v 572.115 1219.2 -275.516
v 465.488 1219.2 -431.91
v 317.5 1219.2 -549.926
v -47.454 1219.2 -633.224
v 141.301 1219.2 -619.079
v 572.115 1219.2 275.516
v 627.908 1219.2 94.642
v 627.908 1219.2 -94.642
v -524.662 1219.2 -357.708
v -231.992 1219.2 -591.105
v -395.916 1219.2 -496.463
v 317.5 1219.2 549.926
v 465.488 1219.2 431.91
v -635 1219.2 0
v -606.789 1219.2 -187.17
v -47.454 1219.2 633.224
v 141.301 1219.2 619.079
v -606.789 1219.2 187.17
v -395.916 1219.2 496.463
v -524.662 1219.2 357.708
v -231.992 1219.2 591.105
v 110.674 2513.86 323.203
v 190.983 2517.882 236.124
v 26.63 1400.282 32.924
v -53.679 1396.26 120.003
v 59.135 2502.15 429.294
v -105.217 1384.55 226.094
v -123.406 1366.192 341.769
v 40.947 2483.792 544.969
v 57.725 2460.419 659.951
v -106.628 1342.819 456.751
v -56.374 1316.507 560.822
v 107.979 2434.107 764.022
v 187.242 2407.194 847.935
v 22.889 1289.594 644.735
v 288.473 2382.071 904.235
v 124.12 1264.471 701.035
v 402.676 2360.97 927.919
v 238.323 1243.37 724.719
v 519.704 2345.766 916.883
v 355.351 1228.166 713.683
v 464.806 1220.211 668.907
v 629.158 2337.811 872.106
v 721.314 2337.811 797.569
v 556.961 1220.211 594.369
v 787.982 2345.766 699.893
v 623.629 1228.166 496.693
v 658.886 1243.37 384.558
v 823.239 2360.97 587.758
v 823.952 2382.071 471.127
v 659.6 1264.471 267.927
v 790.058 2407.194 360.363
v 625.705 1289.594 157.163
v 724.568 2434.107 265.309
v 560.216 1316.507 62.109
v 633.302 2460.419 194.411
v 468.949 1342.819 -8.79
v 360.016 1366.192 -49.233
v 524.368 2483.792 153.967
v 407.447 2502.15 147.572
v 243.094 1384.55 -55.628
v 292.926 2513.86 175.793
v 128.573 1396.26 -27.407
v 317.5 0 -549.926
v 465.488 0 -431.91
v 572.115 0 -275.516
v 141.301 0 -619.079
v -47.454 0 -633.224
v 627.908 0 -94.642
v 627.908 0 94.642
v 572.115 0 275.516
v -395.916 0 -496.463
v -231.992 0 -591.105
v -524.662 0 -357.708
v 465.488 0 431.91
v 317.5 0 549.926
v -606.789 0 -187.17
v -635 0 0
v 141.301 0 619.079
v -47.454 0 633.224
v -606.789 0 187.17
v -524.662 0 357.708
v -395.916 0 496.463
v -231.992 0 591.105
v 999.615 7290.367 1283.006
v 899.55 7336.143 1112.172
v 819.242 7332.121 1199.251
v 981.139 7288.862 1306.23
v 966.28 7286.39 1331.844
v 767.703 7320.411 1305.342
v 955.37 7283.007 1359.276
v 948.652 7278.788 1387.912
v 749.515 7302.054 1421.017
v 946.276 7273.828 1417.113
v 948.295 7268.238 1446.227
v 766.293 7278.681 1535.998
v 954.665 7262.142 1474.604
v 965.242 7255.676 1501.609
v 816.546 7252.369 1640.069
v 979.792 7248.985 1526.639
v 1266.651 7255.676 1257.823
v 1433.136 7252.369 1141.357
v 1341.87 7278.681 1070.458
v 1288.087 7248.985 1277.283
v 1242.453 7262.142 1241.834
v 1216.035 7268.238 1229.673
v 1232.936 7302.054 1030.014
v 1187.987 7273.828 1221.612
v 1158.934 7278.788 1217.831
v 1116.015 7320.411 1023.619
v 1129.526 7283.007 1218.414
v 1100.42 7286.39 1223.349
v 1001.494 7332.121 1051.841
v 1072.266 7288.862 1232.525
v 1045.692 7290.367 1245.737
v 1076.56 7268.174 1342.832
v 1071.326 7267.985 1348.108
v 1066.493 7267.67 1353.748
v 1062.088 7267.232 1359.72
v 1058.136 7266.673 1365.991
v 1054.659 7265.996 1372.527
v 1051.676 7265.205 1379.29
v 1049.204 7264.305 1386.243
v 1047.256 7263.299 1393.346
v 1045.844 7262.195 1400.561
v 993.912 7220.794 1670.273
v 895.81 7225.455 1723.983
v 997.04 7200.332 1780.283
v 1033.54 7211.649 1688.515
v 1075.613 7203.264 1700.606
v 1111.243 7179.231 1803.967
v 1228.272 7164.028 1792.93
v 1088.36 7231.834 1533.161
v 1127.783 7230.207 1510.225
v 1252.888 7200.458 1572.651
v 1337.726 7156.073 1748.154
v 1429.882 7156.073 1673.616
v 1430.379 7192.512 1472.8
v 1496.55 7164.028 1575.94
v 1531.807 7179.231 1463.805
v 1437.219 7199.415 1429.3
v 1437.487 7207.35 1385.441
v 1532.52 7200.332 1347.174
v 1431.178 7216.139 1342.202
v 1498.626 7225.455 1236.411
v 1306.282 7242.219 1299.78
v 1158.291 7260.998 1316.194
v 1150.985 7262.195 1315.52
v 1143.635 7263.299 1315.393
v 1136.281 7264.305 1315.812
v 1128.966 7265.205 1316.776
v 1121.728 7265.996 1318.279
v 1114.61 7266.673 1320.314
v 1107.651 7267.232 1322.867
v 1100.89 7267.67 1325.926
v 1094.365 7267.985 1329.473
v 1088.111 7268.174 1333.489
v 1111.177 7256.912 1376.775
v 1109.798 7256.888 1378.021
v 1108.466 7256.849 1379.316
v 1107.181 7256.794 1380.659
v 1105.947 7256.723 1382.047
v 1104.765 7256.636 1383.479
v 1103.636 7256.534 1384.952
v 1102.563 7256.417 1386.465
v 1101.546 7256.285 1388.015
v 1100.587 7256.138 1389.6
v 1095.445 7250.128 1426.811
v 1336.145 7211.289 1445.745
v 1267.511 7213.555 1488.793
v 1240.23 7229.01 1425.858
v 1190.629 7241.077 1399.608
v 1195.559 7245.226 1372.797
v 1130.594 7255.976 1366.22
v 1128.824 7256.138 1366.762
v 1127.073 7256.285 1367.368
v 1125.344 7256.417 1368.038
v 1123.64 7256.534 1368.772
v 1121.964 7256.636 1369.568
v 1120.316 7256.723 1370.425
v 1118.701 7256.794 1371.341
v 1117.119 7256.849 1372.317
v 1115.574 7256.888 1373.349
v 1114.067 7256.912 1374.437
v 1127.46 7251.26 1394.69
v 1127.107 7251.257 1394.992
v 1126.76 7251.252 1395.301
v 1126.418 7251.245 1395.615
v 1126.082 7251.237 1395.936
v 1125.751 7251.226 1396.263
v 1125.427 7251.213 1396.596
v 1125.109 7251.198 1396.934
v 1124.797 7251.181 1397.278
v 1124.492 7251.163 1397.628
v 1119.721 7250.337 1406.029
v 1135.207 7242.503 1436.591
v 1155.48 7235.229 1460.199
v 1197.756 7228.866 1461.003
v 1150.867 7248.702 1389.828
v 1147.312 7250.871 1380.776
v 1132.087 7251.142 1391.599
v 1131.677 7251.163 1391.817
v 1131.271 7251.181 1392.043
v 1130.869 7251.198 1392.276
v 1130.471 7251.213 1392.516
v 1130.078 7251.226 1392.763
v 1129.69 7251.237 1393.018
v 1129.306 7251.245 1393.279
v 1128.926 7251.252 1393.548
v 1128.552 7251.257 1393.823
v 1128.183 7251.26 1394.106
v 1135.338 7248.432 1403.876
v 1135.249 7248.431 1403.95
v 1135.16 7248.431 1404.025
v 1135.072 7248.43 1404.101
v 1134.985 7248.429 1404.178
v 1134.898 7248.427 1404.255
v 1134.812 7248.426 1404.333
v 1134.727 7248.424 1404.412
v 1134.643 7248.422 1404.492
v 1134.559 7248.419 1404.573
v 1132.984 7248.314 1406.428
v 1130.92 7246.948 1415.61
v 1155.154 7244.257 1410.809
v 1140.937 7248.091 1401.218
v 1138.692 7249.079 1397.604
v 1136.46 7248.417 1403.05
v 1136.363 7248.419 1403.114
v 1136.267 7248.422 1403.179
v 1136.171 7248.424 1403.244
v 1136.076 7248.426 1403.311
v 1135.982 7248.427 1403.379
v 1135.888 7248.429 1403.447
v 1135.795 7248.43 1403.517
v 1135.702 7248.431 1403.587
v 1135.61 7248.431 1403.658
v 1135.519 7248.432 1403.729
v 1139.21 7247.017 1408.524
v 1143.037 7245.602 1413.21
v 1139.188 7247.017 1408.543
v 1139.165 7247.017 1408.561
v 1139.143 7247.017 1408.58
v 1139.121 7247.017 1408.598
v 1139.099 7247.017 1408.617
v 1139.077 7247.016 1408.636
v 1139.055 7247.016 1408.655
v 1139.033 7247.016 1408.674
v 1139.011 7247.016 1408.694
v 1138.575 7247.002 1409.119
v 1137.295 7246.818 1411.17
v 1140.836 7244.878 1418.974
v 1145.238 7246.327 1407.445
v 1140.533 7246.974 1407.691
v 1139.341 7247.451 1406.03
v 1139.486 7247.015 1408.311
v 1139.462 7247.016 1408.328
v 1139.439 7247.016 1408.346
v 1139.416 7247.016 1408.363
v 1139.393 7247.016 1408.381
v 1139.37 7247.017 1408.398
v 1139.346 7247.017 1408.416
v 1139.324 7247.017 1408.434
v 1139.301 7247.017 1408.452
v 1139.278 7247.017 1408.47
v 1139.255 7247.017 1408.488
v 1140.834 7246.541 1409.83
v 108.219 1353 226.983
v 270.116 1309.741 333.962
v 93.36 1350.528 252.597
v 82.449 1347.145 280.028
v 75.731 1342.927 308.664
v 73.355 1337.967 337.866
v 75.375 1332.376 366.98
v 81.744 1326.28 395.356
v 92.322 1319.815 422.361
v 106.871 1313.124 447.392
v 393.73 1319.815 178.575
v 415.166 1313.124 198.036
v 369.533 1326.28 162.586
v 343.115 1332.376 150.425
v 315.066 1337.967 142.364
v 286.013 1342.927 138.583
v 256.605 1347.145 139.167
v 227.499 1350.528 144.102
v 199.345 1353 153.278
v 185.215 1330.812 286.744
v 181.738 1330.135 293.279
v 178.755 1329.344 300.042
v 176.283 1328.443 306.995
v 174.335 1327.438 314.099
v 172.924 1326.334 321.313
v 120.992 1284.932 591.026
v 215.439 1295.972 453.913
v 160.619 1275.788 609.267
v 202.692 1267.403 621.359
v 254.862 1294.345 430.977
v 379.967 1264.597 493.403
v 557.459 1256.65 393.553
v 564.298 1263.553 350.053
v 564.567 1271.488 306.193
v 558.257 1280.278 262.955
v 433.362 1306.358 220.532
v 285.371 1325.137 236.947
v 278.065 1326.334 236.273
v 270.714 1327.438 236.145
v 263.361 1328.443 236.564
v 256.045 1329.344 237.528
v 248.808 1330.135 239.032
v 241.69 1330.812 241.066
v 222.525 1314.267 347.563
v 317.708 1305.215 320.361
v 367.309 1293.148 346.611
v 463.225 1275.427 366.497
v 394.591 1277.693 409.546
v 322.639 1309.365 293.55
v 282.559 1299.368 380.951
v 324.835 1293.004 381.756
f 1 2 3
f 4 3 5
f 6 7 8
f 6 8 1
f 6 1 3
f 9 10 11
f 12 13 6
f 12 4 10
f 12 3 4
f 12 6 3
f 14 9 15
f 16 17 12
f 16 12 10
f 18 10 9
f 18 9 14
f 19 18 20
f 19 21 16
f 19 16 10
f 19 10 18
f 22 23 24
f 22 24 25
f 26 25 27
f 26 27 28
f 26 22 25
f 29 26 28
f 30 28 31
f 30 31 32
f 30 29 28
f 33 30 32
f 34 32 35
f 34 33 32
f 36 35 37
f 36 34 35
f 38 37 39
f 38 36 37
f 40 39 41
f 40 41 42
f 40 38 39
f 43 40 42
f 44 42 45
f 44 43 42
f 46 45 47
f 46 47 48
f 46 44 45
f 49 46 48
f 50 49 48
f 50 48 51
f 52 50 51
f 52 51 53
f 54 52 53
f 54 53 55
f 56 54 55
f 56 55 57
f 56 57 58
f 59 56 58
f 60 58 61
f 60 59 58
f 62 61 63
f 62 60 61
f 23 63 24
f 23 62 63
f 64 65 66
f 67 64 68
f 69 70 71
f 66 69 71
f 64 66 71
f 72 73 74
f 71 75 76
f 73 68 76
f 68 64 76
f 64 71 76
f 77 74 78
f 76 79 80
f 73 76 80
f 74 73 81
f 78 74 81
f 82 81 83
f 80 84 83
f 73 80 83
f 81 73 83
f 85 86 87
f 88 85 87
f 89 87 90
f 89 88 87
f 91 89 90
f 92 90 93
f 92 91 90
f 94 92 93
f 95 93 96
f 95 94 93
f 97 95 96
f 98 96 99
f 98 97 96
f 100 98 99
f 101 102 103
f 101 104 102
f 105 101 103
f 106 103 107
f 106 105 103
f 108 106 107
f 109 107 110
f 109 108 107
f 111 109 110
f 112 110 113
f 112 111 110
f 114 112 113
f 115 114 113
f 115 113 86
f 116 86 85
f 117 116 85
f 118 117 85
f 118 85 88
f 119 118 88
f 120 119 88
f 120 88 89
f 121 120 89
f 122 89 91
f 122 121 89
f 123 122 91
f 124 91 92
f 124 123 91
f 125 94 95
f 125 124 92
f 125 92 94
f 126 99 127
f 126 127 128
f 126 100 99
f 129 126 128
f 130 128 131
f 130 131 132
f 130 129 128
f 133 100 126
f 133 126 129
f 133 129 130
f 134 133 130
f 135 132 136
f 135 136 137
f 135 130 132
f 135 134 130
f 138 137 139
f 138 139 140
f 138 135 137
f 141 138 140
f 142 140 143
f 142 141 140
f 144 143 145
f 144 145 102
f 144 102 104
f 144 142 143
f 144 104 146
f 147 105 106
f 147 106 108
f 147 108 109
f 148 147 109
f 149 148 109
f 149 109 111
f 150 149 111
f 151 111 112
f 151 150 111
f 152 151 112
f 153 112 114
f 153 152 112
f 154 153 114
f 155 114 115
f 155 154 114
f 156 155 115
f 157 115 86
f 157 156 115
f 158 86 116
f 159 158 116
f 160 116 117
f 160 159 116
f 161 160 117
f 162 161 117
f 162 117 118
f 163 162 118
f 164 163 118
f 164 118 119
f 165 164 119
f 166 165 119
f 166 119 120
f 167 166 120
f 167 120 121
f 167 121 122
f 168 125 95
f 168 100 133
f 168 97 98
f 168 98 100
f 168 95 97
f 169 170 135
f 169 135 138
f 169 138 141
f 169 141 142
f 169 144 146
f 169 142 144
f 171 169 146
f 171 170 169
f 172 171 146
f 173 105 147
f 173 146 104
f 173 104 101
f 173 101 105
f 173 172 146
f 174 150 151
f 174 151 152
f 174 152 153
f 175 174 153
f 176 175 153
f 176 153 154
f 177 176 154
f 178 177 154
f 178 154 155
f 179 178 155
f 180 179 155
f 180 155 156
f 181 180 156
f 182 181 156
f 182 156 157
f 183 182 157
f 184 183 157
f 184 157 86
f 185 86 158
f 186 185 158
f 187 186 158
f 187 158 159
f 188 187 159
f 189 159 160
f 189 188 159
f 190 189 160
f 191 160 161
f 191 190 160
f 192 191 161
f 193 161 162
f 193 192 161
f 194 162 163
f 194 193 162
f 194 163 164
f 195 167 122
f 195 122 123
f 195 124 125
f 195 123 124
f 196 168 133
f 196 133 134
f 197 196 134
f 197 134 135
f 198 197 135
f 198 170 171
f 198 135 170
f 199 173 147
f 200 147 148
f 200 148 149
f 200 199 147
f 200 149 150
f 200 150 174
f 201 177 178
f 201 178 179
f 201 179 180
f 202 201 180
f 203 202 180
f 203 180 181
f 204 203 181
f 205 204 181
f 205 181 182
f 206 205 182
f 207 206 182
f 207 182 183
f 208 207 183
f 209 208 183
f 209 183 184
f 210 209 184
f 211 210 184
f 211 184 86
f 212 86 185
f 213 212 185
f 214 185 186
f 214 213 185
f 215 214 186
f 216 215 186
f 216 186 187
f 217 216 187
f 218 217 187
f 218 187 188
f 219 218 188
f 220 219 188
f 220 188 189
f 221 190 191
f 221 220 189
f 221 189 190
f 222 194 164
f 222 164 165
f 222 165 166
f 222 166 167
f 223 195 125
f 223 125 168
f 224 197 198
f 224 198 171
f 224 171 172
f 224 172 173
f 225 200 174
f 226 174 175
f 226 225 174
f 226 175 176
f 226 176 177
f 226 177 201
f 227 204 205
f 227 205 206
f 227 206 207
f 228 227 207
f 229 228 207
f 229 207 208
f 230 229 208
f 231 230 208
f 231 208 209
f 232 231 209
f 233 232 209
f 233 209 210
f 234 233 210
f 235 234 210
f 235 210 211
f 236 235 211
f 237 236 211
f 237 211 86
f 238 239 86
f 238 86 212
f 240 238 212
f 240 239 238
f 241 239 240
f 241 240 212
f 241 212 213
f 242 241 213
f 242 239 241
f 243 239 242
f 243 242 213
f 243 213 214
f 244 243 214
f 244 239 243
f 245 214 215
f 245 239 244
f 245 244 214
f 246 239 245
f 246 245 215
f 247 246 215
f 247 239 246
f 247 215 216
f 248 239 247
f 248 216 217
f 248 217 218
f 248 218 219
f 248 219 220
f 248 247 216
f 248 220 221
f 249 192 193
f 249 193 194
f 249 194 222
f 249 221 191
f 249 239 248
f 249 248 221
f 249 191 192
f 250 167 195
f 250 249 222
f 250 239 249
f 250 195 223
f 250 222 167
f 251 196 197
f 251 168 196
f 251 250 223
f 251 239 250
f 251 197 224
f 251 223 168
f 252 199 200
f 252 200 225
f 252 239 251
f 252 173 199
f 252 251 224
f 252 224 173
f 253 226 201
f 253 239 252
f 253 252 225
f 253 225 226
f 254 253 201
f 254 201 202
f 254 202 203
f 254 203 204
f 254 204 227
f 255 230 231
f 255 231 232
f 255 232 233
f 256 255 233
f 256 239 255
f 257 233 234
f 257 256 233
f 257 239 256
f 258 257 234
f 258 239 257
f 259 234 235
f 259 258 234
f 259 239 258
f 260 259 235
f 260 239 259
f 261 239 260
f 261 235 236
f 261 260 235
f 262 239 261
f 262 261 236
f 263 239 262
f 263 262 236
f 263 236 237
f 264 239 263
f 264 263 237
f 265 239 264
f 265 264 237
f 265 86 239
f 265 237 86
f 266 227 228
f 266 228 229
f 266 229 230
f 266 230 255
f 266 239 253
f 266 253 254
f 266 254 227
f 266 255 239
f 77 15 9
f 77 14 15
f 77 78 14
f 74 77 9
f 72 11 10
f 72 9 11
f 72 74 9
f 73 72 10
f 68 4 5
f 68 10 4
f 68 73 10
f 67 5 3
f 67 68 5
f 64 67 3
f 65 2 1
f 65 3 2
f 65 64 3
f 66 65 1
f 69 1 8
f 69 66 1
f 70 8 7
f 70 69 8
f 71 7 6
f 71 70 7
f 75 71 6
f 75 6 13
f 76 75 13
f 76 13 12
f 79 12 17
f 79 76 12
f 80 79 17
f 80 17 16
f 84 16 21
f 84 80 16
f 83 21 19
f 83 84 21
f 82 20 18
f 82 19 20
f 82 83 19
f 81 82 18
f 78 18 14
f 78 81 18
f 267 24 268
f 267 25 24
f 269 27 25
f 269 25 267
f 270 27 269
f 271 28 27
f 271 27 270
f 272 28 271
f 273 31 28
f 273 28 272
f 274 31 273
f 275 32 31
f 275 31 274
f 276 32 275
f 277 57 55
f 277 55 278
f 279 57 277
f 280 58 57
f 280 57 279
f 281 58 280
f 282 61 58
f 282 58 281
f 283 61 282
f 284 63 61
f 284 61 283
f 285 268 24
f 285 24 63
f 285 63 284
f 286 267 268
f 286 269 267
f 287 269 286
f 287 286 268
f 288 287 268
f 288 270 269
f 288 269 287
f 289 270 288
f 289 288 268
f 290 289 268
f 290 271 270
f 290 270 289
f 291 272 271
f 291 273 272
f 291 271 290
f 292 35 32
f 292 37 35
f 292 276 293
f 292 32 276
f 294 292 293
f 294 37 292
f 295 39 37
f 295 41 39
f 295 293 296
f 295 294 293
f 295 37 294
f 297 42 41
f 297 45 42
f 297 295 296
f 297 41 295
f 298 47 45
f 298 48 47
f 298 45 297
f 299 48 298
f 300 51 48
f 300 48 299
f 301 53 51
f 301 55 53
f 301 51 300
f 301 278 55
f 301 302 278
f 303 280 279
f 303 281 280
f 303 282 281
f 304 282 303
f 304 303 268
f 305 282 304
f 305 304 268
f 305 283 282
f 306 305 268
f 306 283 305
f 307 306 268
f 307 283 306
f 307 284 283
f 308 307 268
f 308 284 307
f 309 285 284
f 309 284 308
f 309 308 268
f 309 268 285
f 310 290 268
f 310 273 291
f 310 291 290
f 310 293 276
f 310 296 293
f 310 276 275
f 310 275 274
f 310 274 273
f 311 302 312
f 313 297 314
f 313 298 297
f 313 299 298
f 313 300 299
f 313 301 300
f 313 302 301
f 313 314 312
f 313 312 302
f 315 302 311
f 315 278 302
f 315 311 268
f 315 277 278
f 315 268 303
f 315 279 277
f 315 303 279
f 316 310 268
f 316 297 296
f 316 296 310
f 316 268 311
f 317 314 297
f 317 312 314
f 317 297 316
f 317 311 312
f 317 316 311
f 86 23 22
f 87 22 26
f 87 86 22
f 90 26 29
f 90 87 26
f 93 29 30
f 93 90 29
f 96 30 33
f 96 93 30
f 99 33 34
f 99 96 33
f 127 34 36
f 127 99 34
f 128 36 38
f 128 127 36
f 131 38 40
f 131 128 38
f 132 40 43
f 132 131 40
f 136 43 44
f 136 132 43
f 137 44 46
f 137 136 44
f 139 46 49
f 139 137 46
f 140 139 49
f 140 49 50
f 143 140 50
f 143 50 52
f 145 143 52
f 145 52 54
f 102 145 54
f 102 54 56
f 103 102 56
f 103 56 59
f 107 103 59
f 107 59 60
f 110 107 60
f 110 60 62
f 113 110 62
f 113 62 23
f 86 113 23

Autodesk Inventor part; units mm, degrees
ref_plane "YZ Plane" through (0, 0, 0) normal (1, 0, 0) x (0, 1, 0)
sketch "Sketch1" plane through (0, 0, 0) normal (0, 1, 0) x (-1, 0, 0)
  circle A0 centre (0, 0) radius 635
  dimension "d0" = 1270
extrude "Extrusion1" add sketch "Sketch1" along normal blind 1219.2
ref_plane "Work Plane2" through (0, 0, 635) normal (0, 0, 1) x (1, 0, 0)
ref_plane "Work Plane3" through (0, 0, 939.8) normal (0, 0, 1) x (1, 0, 0)
sketch "Sketch2" plane through (0, 1219.2, 0) normal (0, 1, 0) x (1, 0, 0)
  line L0 (0, 0) -> (698.5, -863.6)
  line L1 (698.5, -863.6) -> (0, -863.6)
  line L2 (0, -863.6) -> (0, 0)
  circle A0 centre (0, 0) radius 635 projected
  line L3 (1039.1588, -635) -> (-914.0265, -635) projected
  line L4 (1039.1588, -939.8) -> (-914.0265, -939.8) projected
  line L5 (760.1324, -939.8) -> (0, -939.8)
  point P0 (513.6029, -635)
  dimension "d3" = 863.6
  dimension "d11" = 698.5
ref_plane "Work Plane5" through (0, 1219.2, 0) normal (-0.7775111, 0, 0.6288692) x (0.6288692, 0, 0.7775111)
sketch "Sketch4" plane through (0, 1219.2, 0) normal (0, 1, 0) x (1, 0, 0)
  line L0 (0, -863.6) -> (0, 0) projected
  line L1 (1024.4813, -1266.6315) -> (-825.9616, 1021.1889) projected
  line L2 (1039.1588, -939.8) -> (-914.0265, -939.8) projected
  line L3 (0, -838.2) -> (677.9559, -838.2)
  dimension "d10" = 101.6
sketch "Sketch3" plane through (0, 1219.2, 0) normal (-0.7775111, 0, 0.6288692) x (0.6288692, 0, 0.7775111)
  line L0 (1208.7288, 0) -> (1208.7288, 1117.6)
  line L1 (635, -1219.2) -> (-635, -1219.2) projected
  line L2 (816.7086, 0) -> (1078.0554, 1117.6)
  line L3 (1078.0554, 0) -> (1078.0554, 1117.6)
  line L4 (0, 0) -> (303.6922, 1298.6821)
  line L5 (1078.0554, 1117.6) -> (303.6922, 1298.6821)
  line L6 (816.7086, 0) -> (42.3454, 181.0821)
  line L7 (429.527, 90.541) -> (1817.6069, 6026.4024)
  line L8 (303.6922, 1298.6821) -> (1430.4253, 6116.9434)
  line L9 (1430.4253, 6116.9434) -> (2204.7886, 5935.8614)
  line L10 (2204.7886, 5935.8614) -> (1078.0554, 1117.6)
  point P0 (0, -1219.2)
  point P1 (690.8738, 1208.141)
  dimension "d8" = 1117.6
  dimension "d9" = 1219.2
  dimension "d13" = 6096
revolve "Revolution1" add sketch "Sketch3" angle 360 about axis through (270.1163, 1309.741, 333.962) along (0.1431957, 0.9737305, 0.1770419) contours L6 L4 L5 L7 | L5 L8 L9 L7
properties part number "Maple_Tree" material "Wood (Maple)"
